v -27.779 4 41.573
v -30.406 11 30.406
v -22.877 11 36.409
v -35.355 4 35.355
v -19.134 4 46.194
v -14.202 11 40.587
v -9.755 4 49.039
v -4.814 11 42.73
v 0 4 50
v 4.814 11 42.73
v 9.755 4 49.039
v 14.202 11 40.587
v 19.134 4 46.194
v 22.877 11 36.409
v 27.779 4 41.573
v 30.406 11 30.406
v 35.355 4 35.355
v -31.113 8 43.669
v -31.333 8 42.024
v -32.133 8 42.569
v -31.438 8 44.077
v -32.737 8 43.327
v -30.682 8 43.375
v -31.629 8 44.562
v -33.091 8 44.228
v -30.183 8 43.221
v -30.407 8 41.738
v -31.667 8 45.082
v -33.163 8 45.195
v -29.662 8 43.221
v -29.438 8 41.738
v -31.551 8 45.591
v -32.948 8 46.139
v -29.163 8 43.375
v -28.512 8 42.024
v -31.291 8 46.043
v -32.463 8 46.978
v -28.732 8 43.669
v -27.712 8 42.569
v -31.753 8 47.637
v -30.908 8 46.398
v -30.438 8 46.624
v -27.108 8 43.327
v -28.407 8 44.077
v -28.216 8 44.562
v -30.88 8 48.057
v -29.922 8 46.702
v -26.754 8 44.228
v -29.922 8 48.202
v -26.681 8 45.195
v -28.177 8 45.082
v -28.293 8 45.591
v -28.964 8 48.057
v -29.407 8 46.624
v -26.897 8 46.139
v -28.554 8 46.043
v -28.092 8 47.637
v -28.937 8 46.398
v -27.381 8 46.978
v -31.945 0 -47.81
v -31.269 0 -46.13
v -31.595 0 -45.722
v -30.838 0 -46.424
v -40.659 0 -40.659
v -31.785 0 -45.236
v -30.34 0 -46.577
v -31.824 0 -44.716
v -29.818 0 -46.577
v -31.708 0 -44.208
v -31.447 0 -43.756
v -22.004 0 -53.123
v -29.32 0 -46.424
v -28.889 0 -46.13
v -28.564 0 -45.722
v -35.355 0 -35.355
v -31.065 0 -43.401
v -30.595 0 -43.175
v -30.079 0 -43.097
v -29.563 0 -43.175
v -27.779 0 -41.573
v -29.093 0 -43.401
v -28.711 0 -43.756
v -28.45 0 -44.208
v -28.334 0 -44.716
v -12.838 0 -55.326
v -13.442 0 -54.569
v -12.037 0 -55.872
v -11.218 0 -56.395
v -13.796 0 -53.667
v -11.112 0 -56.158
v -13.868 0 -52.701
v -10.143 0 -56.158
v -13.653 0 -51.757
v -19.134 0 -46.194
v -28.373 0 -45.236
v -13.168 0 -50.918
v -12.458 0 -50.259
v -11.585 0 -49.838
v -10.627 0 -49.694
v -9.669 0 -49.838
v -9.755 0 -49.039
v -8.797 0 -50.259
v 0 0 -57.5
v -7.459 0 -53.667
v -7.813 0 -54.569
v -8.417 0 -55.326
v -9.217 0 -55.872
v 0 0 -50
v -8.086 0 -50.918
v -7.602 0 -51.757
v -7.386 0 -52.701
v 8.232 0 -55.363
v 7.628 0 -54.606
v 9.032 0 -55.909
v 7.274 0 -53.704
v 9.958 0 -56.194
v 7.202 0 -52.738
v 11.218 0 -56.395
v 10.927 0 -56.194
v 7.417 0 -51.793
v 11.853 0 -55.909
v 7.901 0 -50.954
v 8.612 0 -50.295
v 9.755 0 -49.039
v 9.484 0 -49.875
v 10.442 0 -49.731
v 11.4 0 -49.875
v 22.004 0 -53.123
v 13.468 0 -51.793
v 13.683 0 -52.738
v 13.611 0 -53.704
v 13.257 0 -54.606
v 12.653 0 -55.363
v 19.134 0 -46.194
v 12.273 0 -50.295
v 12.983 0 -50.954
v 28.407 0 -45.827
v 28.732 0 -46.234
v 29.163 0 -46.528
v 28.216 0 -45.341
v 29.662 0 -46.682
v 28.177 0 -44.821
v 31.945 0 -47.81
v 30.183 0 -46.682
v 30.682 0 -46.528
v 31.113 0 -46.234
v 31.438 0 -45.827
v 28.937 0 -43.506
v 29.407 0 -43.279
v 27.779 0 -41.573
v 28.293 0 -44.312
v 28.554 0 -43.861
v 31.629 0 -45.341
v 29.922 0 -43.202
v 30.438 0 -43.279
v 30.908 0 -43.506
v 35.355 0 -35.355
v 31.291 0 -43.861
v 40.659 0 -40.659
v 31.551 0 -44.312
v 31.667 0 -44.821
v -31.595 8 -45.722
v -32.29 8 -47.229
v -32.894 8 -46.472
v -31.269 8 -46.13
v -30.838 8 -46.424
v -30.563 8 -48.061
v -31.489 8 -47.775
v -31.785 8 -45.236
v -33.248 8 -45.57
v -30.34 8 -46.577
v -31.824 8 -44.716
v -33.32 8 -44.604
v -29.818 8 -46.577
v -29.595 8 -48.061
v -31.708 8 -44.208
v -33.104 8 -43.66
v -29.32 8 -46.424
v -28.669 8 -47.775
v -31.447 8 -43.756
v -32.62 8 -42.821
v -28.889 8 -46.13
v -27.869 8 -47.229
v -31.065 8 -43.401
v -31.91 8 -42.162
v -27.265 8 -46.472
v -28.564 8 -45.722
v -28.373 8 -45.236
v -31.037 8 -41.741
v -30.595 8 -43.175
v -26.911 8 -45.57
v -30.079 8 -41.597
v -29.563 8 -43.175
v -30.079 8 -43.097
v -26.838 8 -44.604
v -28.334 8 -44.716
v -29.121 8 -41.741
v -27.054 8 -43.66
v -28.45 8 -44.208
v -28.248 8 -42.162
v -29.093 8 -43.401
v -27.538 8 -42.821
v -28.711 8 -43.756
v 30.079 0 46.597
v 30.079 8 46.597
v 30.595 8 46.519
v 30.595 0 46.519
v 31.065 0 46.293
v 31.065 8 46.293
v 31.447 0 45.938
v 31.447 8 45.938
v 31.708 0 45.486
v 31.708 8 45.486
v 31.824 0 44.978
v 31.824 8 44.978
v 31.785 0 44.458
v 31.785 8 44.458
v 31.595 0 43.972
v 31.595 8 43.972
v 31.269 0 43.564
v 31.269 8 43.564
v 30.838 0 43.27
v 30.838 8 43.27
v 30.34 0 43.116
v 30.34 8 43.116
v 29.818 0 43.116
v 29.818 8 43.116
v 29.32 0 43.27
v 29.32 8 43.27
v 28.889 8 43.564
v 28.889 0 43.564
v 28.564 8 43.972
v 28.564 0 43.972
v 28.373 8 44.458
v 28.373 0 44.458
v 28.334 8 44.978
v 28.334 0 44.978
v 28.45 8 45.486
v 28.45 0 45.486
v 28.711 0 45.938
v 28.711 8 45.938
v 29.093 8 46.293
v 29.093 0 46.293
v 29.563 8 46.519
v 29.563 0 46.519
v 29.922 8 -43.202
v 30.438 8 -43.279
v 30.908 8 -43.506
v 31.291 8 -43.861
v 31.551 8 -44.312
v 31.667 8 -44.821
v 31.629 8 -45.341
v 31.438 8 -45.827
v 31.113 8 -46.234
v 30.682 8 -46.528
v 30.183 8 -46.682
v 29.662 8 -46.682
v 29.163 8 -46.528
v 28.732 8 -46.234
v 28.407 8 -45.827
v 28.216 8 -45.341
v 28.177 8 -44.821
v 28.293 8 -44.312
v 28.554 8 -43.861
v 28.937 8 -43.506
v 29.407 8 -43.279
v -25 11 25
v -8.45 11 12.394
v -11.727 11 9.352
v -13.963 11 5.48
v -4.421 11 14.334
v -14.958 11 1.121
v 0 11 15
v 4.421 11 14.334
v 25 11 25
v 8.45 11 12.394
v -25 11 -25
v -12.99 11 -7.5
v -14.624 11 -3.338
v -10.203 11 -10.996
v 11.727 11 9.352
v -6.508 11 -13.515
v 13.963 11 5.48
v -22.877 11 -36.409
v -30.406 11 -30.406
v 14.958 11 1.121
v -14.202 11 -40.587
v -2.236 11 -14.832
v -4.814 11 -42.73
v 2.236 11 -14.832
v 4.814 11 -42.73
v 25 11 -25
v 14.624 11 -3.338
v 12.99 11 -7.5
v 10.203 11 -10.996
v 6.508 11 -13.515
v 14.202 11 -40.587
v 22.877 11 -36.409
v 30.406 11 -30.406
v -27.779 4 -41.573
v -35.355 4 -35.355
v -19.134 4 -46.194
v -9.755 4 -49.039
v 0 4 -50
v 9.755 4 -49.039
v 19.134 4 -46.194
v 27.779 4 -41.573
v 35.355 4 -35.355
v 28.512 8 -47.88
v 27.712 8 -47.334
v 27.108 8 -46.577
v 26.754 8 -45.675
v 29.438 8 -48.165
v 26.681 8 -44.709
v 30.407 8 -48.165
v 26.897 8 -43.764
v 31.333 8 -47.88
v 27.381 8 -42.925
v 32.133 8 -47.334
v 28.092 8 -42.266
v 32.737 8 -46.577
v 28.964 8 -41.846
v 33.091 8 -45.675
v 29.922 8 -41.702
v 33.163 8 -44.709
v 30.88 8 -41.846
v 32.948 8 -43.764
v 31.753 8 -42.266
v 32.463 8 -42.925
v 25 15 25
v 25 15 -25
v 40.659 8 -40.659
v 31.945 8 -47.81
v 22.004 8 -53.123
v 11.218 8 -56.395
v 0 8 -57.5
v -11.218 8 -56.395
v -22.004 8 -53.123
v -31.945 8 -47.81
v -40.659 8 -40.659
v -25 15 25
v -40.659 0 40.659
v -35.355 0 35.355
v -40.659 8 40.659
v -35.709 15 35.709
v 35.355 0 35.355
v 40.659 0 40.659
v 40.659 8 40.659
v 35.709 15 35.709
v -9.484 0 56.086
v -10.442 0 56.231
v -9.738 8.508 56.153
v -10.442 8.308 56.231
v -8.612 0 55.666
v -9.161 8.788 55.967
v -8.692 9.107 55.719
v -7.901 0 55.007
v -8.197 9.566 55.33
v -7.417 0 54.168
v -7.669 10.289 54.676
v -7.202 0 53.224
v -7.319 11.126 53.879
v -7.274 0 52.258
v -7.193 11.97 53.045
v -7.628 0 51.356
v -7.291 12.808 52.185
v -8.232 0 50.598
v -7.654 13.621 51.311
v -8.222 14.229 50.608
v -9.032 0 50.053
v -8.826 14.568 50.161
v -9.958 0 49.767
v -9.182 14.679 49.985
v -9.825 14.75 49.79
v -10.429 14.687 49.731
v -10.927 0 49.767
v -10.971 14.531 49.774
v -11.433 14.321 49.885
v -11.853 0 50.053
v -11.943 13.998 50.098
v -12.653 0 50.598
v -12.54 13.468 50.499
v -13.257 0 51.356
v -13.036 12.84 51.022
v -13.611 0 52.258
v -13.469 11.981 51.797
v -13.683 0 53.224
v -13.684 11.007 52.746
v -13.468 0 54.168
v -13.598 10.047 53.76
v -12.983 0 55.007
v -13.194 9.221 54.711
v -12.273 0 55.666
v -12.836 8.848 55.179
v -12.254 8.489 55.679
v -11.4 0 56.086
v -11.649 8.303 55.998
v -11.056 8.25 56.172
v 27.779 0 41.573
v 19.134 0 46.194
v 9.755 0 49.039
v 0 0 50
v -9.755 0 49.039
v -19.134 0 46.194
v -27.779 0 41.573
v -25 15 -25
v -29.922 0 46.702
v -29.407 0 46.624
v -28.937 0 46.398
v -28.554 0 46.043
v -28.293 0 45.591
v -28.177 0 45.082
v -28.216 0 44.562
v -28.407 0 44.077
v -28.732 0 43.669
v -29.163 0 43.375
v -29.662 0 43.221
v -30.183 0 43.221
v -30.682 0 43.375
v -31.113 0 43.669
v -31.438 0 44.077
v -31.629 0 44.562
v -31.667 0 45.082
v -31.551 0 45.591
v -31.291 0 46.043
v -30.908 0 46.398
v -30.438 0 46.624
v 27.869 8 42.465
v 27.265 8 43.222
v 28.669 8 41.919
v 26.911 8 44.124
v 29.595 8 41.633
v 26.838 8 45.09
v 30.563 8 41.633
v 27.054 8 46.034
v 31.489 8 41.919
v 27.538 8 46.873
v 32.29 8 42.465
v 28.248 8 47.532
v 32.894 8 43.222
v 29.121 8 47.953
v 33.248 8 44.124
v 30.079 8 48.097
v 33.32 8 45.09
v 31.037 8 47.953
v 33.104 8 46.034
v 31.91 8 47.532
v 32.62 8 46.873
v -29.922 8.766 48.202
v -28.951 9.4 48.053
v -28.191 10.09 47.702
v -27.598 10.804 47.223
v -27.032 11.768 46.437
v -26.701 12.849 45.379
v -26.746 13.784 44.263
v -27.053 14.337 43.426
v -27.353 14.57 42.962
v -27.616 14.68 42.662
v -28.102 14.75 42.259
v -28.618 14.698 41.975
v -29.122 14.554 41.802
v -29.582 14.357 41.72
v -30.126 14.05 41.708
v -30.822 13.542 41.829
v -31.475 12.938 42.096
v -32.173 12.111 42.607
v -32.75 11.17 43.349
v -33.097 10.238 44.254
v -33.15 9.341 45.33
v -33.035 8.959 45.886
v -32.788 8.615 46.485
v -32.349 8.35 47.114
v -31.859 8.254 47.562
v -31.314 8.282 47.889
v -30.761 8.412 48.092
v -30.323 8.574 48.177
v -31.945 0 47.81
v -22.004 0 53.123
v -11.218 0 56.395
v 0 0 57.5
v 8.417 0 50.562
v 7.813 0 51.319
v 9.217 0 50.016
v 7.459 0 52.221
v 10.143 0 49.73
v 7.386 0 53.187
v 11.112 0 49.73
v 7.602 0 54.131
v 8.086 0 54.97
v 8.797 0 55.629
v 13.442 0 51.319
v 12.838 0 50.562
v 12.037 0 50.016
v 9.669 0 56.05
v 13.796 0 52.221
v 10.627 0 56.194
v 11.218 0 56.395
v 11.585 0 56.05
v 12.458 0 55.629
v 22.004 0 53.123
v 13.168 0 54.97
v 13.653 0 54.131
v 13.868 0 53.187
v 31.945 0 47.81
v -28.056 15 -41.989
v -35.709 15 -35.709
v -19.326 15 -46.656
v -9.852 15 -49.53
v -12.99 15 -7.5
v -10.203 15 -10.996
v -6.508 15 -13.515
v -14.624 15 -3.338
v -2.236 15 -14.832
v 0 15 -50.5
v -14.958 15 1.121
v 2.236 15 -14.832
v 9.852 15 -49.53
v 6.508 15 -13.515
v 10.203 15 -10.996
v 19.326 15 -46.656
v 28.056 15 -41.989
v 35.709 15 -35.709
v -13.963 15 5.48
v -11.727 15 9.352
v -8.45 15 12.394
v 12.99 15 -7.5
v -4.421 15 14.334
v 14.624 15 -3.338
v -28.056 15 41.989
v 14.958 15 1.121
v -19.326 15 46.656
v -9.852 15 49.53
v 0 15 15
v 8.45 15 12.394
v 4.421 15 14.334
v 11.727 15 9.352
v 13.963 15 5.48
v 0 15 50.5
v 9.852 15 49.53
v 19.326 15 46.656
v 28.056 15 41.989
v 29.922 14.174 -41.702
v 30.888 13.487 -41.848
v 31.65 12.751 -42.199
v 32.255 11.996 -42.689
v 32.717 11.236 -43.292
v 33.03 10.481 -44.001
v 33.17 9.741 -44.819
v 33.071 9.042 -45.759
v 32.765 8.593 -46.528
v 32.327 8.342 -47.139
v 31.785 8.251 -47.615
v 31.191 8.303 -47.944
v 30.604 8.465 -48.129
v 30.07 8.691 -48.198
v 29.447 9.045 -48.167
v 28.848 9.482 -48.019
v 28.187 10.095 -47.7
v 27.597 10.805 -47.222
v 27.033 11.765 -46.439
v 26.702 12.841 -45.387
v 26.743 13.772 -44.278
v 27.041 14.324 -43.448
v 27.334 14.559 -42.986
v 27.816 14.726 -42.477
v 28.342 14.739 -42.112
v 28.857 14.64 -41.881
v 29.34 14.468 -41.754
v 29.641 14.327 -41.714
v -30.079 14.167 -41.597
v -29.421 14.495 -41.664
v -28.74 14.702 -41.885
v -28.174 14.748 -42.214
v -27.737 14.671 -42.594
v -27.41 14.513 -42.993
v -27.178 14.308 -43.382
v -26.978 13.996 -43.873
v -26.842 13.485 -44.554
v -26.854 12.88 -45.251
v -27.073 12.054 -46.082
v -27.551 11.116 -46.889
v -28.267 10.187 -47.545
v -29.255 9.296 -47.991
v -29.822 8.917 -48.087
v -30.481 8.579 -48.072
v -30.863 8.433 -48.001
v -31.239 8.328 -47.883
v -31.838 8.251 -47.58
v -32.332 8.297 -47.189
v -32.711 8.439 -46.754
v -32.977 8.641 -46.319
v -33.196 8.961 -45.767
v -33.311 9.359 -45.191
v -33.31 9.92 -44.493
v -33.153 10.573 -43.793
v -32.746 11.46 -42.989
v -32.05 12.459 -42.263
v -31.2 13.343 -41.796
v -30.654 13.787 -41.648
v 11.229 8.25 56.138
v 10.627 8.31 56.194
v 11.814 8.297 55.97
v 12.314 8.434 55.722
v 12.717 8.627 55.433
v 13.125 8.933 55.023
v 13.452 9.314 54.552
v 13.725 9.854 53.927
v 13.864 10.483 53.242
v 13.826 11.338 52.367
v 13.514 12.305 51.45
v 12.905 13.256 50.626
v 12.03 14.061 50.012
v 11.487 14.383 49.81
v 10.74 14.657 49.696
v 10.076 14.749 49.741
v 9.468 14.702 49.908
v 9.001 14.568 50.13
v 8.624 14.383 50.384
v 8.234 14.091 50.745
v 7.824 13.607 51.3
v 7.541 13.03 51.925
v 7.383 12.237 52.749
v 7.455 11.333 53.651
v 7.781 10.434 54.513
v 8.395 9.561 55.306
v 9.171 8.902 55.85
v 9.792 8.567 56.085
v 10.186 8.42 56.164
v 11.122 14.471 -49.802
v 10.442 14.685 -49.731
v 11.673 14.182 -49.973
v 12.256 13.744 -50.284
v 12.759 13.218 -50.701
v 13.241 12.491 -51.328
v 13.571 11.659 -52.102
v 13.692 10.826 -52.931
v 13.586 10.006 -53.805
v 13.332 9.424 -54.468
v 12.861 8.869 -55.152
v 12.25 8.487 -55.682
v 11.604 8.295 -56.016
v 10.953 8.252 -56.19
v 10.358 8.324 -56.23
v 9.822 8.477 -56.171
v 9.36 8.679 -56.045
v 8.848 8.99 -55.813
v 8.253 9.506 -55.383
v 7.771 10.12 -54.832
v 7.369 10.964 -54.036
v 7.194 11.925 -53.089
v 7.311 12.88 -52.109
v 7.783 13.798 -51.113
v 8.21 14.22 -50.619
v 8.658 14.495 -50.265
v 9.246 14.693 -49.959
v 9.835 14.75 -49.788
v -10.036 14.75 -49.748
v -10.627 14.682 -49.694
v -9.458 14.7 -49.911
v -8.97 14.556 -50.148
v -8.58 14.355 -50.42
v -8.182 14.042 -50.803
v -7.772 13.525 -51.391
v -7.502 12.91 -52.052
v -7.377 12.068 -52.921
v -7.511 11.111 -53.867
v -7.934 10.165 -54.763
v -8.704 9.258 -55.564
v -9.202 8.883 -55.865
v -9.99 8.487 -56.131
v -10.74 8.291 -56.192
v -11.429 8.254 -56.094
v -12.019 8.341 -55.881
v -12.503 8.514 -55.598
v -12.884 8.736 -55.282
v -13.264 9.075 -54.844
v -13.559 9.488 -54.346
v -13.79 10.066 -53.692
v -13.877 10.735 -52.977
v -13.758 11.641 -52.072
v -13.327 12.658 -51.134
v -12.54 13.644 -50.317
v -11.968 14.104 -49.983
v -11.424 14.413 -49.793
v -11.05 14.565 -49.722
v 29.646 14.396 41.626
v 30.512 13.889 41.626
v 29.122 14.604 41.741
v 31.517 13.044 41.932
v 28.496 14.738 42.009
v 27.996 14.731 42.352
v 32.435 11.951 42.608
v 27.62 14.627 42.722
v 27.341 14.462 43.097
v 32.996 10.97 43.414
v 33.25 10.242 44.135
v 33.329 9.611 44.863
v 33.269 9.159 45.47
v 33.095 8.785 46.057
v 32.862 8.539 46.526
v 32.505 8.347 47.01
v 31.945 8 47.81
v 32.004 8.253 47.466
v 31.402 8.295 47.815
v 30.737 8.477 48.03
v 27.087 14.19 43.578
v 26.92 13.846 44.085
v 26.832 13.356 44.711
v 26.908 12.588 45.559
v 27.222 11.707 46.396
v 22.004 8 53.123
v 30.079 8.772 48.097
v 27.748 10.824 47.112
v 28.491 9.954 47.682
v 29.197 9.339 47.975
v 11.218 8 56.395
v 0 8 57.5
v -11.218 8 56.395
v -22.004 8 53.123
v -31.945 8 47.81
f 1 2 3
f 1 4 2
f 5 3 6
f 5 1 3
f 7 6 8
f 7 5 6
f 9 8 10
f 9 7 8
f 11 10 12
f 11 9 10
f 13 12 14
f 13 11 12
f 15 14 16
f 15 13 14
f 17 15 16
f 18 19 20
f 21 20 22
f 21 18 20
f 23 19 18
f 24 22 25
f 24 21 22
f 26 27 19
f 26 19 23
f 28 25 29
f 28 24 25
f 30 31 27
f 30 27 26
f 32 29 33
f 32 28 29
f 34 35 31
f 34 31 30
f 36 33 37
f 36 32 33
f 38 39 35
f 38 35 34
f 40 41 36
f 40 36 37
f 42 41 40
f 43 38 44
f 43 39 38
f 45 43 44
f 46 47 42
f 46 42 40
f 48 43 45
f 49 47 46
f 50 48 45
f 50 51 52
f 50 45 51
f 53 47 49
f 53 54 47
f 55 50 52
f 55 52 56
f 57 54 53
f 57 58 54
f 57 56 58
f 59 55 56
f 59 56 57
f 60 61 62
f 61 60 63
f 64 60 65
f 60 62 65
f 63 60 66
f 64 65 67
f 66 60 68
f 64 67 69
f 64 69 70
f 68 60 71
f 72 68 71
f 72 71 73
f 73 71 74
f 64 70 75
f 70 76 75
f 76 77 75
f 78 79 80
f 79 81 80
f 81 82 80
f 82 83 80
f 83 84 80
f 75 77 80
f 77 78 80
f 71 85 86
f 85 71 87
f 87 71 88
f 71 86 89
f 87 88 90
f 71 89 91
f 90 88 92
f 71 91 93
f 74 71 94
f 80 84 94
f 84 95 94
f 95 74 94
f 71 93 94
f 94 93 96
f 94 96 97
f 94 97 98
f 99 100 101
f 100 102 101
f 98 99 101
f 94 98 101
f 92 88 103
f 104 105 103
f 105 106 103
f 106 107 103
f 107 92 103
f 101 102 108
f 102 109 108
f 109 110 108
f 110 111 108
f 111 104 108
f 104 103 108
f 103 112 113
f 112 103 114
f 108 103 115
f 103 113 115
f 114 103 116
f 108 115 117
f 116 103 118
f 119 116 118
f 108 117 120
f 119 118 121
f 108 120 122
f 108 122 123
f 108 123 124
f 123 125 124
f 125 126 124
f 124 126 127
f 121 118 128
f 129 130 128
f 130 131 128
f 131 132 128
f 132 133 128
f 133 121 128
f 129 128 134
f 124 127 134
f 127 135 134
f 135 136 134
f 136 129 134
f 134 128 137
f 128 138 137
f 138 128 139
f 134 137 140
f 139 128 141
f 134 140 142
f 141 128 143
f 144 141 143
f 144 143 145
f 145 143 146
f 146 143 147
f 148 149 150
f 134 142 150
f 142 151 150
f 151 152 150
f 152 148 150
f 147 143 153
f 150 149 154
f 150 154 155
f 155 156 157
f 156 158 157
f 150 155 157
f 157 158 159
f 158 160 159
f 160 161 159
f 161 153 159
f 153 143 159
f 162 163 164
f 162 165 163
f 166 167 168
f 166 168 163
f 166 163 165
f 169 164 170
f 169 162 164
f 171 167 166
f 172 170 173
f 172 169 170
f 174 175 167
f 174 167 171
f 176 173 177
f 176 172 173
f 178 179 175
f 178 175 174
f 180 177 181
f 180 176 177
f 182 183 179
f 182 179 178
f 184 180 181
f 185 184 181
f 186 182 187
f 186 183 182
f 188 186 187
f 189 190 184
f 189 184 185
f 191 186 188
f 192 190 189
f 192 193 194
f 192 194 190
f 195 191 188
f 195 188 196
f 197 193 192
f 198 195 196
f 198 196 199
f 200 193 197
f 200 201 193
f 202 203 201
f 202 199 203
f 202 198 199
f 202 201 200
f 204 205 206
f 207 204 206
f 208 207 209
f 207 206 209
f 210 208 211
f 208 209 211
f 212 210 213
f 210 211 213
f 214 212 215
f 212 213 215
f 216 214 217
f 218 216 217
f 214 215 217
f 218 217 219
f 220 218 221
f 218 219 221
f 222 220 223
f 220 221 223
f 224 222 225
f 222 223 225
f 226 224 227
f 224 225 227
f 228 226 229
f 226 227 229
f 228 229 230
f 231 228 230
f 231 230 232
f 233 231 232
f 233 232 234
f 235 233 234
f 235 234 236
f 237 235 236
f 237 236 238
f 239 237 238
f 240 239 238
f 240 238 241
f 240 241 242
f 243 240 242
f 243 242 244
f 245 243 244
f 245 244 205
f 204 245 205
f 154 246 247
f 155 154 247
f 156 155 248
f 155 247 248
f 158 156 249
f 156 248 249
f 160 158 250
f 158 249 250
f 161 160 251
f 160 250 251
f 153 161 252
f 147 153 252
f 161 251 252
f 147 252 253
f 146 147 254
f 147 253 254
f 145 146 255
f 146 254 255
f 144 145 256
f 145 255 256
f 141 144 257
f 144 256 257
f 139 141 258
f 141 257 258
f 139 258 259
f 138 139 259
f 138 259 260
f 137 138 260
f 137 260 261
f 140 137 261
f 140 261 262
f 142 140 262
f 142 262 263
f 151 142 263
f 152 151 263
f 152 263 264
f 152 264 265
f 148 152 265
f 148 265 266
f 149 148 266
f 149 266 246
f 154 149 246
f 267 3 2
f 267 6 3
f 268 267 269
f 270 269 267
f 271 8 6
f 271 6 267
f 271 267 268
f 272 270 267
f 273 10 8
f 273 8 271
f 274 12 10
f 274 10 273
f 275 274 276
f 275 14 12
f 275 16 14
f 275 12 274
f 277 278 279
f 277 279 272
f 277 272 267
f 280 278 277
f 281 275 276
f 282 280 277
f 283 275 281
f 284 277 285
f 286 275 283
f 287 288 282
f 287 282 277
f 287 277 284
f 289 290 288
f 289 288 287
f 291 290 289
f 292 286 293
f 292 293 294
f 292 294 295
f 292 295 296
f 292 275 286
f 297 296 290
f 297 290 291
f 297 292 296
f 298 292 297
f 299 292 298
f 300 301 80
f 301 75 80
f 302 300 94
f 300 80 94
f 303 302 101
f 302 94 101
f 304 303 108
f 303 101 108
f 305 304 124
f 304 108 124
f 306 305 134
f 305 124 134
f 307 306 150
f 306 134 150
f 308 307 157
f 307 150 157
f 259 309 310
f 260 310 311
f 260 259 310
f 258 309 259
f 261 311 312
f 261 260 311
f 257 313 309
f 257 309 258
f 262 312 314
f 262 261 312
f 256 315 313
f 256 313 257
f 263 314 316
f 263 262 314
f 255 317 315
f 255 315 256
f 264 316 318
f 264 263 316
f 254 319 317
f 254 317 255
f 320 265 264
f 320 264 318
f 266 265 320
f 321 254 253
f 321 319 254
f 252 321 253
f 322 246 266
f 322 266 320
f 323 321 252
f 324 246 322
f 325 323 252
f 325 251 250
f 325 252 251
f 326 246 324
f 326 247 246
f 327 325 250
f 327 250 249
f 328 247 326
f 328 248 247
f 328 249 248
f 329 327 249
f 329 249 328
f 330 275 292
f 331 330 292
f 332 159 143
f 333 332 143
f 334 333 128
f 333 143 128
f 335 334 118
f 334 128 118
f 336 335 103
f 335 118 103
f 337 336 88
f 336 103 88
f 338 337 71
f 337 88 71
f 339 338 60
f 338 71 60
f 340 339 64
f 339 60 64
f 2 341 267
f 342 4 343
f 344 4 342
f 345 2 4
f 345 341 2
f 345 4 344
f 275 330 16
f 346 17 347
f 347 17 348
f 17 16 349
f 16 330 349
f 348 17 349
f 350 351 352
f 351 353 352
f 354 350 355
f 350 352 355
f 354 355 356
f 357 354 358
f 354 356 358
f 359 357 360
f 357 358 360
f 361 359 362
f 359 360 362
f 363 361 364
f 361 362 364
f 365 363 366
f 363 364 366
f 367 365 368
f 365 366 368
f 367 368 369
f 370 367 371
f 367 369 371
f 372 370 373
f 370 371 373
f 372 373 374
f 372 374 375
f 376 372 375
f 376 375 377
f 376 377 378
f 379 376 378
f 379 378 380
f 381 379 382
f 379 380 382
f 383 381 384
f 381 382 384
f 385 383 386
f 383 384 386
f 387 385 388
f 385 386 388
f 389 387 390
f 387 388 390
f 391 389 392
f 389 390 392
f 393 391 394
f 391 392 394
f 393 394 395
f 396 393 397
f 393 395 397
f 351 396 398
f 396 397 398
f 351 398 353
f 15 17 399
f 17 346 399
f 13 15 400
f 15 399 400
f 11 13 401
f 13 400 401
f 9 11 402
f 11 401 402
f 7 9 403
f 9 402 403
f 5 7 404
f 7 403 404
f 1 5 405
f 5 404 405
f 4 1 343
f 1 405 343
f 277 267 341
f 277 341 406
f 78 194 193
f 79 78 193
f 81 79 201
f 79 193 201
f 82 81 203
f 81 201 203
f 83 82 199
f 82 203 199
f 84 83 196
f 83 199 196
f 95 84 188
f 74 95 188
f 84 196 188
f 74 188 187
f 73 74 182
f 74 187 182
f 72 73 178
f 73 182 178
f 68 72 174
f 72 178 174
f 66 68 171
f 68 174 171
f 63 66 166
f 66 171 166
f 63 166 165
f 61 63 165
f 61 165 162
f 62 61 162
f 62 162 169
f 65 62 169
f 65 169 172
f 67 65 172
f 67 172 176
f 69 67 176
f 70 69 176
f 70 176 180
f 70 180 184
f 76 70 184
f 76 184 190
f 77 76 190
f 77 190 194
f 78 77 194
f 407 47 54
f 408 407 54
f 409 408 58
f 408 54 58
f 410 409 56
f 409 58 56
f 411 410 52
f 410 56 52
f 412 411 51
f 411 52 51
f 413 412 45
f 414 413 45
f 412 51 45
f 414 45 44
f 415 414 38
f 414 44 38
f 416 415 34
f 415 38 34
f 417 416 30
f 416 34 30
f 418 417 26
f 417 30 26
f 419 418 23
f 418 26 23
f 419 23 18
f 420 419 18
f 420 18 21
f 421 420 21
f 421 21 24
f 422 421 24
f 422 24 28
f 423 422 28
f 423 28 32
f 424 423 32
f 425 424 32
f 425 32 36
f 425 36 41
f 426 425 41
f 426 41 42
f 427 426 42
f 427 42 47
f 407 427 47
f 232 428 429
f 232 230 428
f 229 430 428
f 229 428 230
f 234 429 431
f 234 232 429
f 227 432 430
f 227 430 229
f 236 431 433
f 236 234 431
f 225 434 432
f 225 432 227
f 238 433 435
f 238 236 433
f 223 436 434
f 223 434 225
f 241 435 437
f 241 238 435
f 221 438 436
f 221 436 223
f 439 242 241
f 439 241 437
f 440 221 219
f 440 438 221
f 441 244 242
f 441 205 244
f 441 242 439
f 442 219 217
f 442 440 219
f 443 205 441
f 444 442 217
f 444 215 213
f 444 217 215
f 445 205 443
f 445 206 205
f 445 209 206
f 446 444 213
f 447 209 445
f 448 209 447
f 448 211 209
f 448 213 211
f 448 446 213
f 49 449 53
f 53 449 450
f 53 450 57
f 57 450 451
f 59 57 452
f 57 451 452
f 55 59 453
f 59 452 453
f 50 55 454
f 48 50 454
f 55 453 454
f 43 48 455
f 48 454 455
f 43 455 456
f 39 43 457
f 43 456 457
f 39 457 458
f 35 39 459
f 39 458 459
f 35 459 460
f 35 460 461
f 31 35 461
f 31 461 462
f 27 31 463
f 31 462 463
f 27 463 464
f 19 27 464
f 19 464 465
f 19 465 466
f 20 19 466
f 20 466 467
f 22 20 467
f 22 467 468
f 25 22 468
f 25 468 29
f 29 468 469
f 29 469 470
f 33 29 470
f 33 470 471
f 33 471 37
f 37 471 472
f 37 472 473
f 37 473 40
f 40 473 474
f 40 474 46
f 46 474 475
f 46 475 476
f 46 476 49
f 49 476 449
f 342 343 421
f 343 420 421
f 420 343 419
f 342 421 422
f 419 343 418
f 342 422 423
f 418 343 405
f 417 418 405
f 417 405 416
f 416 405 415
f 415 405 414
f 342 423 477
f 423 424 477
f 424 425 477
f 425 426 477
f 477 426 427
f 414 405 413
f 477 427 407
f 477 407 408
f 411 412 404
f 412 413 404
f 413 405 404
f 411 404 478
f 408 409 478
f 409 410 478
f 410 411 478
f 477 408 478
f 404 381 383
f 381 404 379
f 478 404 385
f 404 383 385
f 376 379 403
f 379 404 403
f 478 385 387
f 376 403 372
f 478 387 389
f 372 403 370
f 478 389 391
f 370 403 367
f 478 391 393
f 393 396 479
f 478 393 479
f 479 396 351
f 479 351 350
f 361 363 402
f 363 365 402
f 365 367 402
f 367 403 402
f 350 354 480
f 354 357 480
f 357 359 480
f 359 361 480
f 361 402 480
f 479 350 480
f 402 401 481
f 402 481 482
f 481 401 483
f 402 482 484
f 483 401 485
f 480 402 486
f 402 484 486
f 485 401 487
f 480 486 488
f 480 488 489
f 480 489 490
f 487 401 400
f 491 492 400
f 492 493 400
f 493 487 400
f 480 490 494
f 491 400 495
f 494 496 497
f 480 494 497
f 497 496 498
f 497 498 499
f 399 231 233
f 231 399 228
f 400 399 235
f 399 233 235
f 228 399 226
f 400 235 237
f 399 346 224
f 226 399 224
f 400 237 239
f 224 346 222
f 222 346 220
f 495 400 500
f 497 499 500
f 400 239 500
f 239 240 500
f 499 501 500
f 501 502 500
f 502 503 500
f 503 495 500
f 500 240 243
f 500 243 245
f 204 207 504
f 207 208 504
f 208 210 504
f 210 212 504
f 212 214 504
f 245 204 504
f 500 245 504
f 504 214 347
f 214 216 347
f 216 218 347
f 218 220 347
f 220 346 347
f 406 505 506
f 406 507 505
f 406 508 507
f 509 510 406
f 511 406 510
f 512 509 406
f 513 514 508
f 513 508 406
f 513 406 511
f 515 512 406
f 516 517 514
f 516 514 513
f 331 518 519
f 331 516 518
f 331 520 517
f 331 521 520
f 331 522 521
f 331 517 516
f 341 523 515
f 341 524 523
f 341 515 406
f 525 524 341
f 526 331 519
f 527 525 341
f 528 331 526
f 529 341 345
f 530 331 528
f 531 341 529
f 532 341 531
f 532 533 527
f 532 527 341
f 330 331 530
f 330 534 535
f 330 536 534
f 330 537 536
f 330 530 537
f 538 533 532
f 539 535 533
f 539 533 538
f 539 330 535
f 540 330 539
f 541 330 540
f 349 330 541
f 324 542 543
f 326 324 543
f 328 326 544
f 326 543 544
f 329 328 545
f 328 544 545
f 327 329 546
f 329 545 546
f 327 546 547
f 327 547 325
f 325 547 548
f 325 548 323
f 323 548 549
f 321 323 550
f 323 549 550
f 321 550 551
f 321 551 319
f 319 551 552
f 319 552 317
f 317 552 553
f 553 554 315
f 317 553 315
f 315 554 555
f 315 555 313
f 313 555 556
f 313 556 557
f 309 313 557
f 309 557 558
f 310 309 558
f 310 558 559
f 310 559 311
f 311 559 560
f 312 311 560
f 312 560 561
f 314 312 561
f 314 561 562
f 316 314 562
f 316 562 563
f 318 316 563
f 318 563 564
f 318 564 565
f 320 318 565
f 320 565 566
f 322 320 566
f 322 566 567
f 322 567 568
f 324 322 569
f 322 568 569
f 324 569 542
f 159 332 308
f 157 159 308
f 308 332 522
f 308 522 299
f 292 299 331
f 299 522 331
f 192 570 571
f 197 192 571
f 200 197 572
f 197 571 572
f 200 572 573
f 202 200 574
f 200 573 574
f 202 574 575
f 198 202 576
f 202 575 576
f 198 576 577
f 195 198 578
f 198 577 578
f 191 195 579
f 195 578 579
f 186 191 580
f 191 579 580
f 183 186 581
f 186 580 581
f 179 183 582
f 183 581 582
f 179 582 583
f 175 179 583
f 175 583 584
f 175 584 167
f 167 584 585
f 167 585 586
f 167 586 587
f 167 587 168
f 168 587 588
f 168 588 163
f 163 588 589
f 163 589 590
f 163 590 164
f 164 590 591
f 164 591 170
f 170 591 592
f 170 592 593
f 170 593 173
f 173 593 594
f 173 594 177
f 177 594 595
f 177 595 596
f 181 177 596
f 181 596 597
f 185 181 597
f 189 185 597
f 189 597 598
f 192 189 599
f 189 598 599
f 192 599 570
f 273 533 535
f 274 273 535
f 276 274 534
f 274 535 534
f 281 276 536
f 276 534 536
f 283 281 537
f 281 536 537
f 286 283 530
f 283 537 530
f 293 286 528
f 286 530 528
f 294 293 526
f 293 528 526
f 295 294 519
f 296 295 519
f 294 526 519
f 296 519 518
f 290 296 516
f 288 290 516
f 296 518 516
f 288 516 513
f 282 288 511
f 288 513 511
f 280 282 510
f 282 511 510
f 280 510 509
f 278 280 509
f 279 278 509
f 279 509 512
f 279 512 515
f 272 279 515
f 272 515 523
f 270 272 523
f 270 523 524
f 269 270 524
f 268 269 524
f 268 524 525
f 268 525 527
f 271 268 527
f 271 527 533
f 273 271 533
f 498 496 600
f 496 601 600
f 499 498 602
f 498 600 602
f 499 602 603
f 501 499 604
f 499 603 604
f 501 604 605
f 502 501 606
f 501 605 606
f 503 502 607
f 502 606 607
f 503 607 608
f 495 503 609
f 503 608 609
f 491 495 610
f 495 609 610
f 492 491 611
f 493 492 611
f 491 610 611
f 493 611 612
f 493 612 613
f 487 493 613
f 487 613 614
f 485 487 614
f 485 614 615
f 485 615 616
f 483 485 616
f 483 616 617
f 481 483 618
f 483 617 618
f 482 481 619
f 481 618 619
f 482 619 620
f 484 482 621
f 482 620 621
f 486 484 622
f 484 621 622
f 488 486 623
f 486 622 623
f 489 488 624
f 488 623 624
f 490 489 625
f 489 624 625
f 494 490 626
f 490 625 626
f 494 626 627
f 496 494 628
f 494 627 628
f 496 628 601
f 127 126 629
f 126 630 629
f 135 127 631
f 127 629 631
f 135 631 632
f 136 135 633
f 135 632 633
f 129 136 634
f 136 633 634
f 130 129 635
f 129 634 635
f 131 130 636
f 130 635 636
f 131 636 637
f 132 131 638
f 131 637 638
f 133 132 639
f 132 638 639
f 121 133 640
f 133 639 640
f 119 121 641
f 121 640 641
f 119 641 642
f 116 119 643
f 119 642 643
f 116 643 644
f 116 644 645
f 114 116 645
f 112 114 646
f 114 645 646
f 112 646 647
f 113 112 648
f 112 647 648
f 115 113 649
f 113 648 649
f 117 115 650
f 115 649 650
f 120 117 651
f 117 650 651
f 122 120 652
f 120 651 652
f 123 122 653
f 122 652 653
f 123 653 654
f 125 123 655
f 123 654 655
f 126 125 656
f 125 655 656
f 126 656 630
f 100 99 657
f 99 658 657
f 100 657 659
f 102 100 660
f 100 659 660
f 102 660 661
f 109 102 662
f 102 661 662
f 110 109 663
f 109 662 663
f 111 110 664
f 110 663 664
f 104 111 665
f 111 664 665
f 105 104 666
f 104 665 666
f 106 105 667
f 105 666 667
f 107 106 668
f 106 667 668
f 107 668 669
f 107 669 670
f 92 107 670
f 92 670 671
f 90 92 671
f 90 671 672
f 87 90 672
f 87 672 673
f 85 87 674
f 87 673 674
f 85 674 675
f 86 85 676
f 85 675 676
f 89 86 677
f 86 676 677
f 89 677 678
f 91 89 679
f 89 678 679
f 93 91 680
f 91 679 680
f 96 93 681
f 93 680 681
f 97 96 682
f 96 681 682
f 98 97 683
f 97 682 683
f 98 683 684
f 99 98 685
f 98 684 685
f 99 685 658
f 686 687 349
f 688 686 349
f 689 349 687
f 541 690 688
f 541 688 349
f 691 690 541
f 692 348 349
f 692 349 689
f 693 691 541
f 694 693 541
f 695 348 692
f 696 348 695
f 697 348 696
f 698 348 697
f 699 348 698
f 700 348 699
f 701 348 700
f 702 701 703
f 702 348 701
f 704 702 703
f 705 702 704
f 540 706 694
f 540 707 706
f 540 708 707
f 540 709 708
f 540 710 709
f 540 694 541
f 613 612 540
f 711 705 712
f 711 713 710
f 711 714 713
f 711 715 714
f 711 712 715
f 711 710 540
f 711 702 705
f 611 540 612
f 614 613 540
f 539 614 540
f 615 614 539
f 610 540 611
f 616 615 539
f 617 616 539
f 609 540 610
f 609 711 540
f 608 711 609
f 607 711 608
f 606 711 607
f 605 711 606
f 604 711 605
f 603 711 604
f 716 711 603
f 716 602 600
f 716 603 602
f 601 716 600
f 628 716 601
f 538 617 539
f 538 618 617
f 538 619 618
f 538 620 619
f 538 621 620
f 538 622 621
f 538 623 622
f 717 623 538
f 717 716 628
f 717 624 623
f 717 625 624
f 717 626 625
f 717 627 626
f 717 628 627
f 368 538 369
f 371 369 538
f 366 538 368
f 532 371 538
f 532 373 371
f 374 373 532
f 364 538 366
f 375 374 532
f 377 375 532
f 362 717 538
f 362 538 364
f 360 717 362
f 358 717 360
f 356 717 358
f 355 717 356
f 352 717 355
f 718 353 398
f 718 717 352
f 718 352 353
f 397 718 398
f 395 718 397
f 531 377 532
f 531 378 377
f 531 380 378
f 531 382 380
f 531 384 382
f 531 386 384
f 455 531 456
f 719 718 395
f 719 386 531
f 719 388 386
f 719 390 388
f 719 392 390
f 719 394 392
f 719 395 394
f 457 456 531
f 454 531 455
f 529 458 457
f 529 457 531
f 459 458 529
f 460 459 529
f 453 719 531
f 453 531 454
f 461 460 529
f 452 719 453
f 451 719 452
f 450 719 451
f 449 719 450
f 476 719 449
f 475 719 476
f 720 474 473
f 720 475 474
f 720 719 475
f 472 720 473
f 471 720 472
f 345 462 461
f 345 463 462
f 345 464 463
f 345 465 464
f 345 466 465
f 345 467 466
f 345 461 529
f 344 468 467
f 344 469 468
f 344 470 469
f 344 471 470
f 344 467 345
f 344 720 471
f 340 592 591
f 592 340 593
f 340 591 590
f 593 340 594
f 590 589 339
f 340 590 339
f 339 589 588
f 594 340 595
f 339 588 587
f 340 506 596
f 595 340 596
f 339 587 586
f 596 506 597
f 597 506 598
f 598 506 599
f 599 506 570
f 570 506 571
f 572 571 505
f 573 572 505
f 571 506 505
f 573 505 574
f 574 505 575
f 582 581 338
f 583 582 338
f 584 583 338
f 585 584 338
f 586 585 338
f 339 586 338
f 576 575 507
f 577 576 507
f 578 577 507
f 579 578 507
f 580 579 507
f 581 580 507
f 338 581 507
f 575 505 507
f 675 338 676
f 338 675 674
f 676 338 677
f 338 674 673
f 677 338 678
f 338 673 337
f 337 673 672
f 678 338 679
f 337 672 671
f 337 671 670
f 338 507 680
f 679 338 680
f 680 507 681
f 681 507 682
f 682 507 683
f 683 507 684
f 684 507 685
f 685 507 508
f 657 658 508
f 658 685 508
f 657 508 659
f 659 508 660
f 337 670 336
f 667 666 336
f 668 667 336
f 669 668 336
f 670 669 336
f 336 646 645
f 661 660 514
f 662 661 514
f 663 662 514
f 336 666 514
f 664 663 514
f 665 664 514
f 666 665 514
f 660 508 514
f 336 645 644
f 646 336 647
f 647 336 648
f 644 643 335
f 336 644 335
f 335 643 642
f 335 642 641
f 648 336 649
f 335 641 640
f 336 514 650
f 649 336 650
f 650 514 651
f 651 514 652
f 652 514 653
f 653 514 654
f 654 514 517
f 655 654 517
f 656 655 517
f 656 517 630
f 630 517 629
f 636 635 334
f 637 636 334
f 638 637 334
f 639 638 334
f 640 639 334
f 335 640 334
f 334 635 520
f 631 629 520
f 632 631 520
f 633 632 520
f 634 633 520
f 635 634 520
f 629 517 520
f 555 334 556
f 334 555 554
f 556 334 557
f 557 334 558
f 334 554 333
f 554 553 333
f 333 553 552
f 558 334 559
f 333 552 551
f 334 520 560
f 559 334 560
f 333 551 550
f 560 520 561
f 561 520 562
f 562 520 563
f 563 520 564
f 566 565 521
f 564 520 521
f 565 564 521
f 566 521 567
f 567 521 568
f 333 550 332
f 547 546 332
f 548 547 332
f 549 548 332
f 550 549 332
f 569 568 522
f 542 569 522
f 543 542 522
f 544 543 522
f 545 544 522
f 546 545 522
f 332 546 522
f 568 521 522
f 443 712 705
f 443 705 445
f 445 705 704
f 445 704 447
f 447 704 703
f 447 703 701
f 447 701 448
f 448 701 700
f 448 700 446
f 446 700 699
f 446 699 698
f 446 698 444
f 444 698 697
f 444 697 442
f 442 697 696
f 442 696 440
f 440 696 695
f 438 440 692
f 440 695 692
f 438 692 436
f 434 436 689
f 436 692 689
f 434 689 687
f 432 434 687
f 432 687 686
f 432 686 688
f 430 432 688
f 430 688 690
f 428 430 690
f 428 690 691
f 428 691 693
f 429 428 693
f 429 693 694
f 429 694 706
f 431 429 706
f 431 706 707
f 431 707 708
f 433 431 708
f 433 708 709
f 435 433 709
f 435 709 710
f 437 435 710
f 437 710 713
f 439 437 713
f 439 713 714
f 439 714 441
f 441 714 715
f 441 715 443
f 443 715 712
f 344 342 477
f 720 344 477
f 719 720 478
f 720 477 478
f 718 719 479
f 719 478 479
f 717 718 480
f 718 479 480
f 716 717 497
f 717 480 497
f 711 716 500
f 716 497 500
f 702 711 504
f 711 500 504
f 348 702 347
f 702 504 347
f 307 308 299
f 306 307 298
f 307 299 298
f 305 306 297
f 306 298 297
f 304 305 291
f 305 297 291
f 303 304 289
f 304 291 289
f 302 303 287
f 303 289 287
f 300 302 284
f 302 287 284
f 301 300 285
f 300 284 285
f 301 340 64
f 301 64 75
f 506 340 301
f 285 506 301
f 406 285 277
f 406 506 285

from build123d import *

# Parameters (mm, degrees)
SKETCH1_R           = 57.5
BOSS_EXTRUDE1_DEPTH = 15
SKETCH2_R           = 50
CUT_EXTRUDE1_DEPTH  = 11
SKETCH3_R           = 15
SKETCH3_R_2         = 1.75
CUT_EXTRUDE2_DEPTH  = 15
CUT_EXTRUDE3_START  = -15
CUT_EXTRUDE3_DEPTH  = 15
CHAMFER1_SIZE       = 7
SKETCH5_R           = 3.25
CUT_EXTRUDE4_DEPTH  = 7
SKETCH6_R           = 3.25
CUT_EXTRUDE5_DEPTH  = 55


with BuildPart() as part:
    # Sketch1 → Boss-Extrude1 (new body)
    with BuildSketch(Plane(origin=(0, 0, 0), x_dir=(1, 0, 0), z_dir=(0, 1, 0))):
        with Locations(Location((0, 0, 0), (0, 0, 270))):
            Circle(SKETCH1_R)
    extrude(amount=BOSS_EXTRUDE1_DEPTH)

    # Sketch2 → Cut-Extrude1 (cut)
    with BuildSketch(Plane.XZ):
        with Locations(Location((0, 0, 0), (0, 0, 270))):
            Circle(SKETCH2_R)
    extrude(amount=-CUT_EXTRUDE1_DEPTH, mode=Mode.SUBTRACT)

    # Sketch3 → Cut-Extrude2 (cut)
    with BuildSketch(Plane(origin=(0, 15, 0), x_dir=(1, 0, 0), z_dir=(0, 1, 0))):
        with Locations(Location((0, 0, 0), (0, 0, 270))):
            Circle(SKETCH3_R)
        with Locations(Location((-10.627298131, 52.943937655, 0), (0, 0, 270))):
            Circle(SKETCH3_R_2)
        with Locations(Location((10.442424555, 52.980711296, 0), (0, 0, 270))):
            Circle(SKETCH3_R_2)
        with Locations(Location((29.922382764, 44.951651913, 0), (0, 0, 270))):
            Circle(SKETCH3_R_2)
        with Locations(Location((44.846929444, 30.079111014, 0), (0, 0, 270))):
            Circle(SKETCH3_R_2)
        with Locations(Location((52.943937655, 10.627298131, 0), (0, 0, 270))):
            Circle(SKETCH3_R_2)
        with Locations(Location((52.980711296, -10.442424555, 0), (0, 0, 270))):
            Circle(SKETCH3_R_2)
        with Locations(Location((44.951651913, -29.922382764, 0), (0, 0, 270))):
            Circle(SKETCH3_R_2)
        with Locations(Location((30.079111014, -44.846929444, 0), (0, 0, 270))):
            Circle(SKETCH3_R_2)
        with Locations(Location((10.627298131, -52.943937655, 0), (0, 0, 270))):
            Circle(SKETCH3_R_2)
        with Locations(Location((-10.442424555, -52.980711296, 0), (0, 0, 270))):
            Circle(SKETCH3_R_2)
        with Locations(Location((-29.922382764, -44.951651913, 0), (0, 0, 270))):
            Circle(SKETCH3_R_2)
        with Locations(Location((-44.846929444, -30.079111014, 0), (0, 0, 270))):
            Circle(SKETCH3_R_2)
        with Locations(Location((-52.943937655, -10.627298131, 0), (0, 0, 270))):
            Circle(SKETCH3_R_2)
        with Locations(Location((-52.980711296, 10.442424555, 0), (0, 0, 270))):
            Circle(SKETCH3_R_2)
        with Locations(Location((-44.951651913, 29.922382764, 0), (0, 0, 270))):
            Circle(SKETCH3_R_2)
        with Locations(Location((-30.079111014, 44.846929444, 0), (0, 0, 270))):
            Circle(SKETCH3_R_2)
    extrude(amount=-CUT_EXTRUDE2_DEPTH, mode=Mode.SUBTRACT)

    # Sketch4 → Cut-Extrude3 (cut)
    with BuildSketch(Plane(origin=(0, 15, 0), x_dir=(1, 0, 0), z_dir=(0, 1, 0)).offset(CUT_EXTRUDE3_START)):
        with BuildLine():
            Line((25, 25), (40.658639918, 40.658639918))
            ThreePointArc((40.658639918, 40.658639918), (57.5, 0), (40.658639918, -40.658639918))
            Line((40.658639918, -40.658639918), (25, -25))
            Line((25, -25), (25, 25))
        make_face()
    cut_extrude3 = extrude(amount=CUT_EXTRUDE3_DEPTH, mode=Mode.SUBTRACT)

    # Mirror1: Cut-Extrude3 across plane
    add(cut_extrude3.mirror(Plane(origin=(0, 0, 0), x_dir=(0, 0, 1), z_dir=(1, 0, 0))), mode=Mode.SUBTRACT)

    # Chamfer1
    # the kernel refuses this chamfer: 7 mm, written as the material it adds along each edge
    with BuildSketch(Plane(origin=(0, 11, 0), x_dir=(0.7071067811865475, 0, -0.7071067811865477), z_dir=(0.7071067811865477, 0, 0.7071067811865475))) as chamfer1_piece_1:
        Polygon((50, -CHAMFER1_SIZE), (50 - CHAMFER1_SIZE, 0), (50, 0), align=None)
    revolve(axis=Axis((0, 11, 0), (0, 1, 0)), revolution_arc=90)
    with BuildSketch(Plane(origin=(0, 11, 0), x_dir=(-0.7071067811865476, 0, 0.7071067811865476), z_dir=(-0.7071067811865476, 0, -0.7071067811865476))) as chamfer1_piece_2:
        Polygon((50 - CHAMFER1_SIZE, 0), (50, -CHAMFER1_SIZE), (50, 0), align=None)
    revolve(axis=Axis((0, 11, 0), (0, 1, 0)), revolution_arc=90)
    # the kernel refuses this chamfer: 7 mm, written as the material it takes off along each edge
    with BuildSketch(Plane(origin=(0, 15, 0), x_dir=(0.890570714861766, 0, 0.4548448107108656), z_dir=(0.4548448107108656, 0, -0.890570714861766))) as chamfer1_2_piece_1:
        Polygon((57.5 - CHAMFER1_SIZE, 0), (57.5, CHAMFER1_SIZE), (57.5, 0), align=None)
    revolve(axis=Axis((0, 15, 0), (0, -1, 0)), revolution_arc=125.890100955, mode=Mode.SUBTRACT)
    with BuildSketch(Plane(origin=(0, 15, 0), x_dir=(-0.890570714861766, 0, -0.4548448107108656), z_dir=(-0.4548448107108656, 0, 0.890570714861766))) as chamfer1_2_piece_2:
        Polygon((57.5, CHAMFER1_SIZE), (57.5 - CHAMFER1_SIZE, 0), (57.5, 0), align=None)
    revolve(axis=Axis((0, 15, 0), (0, -1, 0)), revolution_arc=125.890100955, mode=Mode.SUBTRACT)

    # Sketch5 → Cut-Extrude4 (cut)
    with BuildSketch(Plane(origin=(0, 15, 0), x_dir=(1, 0, 0), z_dir=(0, 1, 0))):
        with Locations(Location((-10.627298131, 52.943937655, 0), (0, 0, 270))):
            Circle(SKETCH5_R)
        with Locations(Location((10.442424555, 52.980711296, 0), (0, 0, 270))):
            Circle(SKETCH5_R)
        with Locations(Location((29.922382764, 44.951651913, 0), (0, 0, 270))):
            Circle(SKETCH5_R)
        with Locations((44.846929444, 30.079111014)):
            Circle(SKETCH5_R)
        with Locations((52.943937655, 10.627298131)):
            Circle(SKETCH5_R)
        with Locations((52.980711296, -10.442424555)):
            Circle(SKETCH5_R)
        with Locations((44.951651913, -29.922382764)):
            Circle(SKETCH5_R)
        with Locations(Location((30.079111014, -44.846929444, 0), (0, 0, 270))):
            Circle(SKETCH5_R)
        with Locations(Location((10.627298131, -52.943937655, 0), (0, 0, 270))):
            Circle(SKETCH5_R)
        with Locations(Location((-10.442424555, -52.980711296, 0), (0, 0, 270))):
            Circle(SKETCH5_R)
        with Locations(Location((-29.922382764, -44.951651913, 0), (0, 0, 270))):
            Circle(SKETCH5_R)
        with Locations((-44.846929444, -30.079111014)):
            Circle(SKETCH5_R)
        with Locations((-52.943937655, -10.627298131)):
            Circle(SKETCH5_R)
        with Locations((-52.980711296, 10.442424555)):
            Circle(SKETCH5_R)
        with Locations((-44.951651913, 29.922382764)):
            Circle(SKETCH5_R)
        with Locations(Location((-30.079111014, 44.846929444, 0), (0, 0, 270))):
            Circle(SKETCH5_R)
    extrude(amount=-CUT_EXTRUDE4_DEPTH, mode=Mode.SUBTRACT)

    # Sketch6 → Cut-Extrude5 (cut)
    with BuildSketch(Plane(origin=(0, 15, 0), x_dir=(1, 0, 0), z_dir=(0, 1, 0))):
        with Locations(Location((-10.627298131, 52.943937655, 0), (0, 0, 270))):
            Circle(SKETCH6_R)
        with Locations(Location((10.442424555, 52.980711296, 0), (0, 0, 270))):
            Circle(SKETCH6_R)
        with Locations(Location((-10.442424555, -52.980711296, 0), (0, 0, 270))):
            Circle(SKETCH6_R)
        with Locations(Location((10.627298131, -52.943937655, 0), (0, 0, 270))):
            Circle(SKETCH6_R)
    extrude(amount=-CUT_EXTRUDE5_DEPTH, mode=Mode.SUBTRACT)


solid = part.part
